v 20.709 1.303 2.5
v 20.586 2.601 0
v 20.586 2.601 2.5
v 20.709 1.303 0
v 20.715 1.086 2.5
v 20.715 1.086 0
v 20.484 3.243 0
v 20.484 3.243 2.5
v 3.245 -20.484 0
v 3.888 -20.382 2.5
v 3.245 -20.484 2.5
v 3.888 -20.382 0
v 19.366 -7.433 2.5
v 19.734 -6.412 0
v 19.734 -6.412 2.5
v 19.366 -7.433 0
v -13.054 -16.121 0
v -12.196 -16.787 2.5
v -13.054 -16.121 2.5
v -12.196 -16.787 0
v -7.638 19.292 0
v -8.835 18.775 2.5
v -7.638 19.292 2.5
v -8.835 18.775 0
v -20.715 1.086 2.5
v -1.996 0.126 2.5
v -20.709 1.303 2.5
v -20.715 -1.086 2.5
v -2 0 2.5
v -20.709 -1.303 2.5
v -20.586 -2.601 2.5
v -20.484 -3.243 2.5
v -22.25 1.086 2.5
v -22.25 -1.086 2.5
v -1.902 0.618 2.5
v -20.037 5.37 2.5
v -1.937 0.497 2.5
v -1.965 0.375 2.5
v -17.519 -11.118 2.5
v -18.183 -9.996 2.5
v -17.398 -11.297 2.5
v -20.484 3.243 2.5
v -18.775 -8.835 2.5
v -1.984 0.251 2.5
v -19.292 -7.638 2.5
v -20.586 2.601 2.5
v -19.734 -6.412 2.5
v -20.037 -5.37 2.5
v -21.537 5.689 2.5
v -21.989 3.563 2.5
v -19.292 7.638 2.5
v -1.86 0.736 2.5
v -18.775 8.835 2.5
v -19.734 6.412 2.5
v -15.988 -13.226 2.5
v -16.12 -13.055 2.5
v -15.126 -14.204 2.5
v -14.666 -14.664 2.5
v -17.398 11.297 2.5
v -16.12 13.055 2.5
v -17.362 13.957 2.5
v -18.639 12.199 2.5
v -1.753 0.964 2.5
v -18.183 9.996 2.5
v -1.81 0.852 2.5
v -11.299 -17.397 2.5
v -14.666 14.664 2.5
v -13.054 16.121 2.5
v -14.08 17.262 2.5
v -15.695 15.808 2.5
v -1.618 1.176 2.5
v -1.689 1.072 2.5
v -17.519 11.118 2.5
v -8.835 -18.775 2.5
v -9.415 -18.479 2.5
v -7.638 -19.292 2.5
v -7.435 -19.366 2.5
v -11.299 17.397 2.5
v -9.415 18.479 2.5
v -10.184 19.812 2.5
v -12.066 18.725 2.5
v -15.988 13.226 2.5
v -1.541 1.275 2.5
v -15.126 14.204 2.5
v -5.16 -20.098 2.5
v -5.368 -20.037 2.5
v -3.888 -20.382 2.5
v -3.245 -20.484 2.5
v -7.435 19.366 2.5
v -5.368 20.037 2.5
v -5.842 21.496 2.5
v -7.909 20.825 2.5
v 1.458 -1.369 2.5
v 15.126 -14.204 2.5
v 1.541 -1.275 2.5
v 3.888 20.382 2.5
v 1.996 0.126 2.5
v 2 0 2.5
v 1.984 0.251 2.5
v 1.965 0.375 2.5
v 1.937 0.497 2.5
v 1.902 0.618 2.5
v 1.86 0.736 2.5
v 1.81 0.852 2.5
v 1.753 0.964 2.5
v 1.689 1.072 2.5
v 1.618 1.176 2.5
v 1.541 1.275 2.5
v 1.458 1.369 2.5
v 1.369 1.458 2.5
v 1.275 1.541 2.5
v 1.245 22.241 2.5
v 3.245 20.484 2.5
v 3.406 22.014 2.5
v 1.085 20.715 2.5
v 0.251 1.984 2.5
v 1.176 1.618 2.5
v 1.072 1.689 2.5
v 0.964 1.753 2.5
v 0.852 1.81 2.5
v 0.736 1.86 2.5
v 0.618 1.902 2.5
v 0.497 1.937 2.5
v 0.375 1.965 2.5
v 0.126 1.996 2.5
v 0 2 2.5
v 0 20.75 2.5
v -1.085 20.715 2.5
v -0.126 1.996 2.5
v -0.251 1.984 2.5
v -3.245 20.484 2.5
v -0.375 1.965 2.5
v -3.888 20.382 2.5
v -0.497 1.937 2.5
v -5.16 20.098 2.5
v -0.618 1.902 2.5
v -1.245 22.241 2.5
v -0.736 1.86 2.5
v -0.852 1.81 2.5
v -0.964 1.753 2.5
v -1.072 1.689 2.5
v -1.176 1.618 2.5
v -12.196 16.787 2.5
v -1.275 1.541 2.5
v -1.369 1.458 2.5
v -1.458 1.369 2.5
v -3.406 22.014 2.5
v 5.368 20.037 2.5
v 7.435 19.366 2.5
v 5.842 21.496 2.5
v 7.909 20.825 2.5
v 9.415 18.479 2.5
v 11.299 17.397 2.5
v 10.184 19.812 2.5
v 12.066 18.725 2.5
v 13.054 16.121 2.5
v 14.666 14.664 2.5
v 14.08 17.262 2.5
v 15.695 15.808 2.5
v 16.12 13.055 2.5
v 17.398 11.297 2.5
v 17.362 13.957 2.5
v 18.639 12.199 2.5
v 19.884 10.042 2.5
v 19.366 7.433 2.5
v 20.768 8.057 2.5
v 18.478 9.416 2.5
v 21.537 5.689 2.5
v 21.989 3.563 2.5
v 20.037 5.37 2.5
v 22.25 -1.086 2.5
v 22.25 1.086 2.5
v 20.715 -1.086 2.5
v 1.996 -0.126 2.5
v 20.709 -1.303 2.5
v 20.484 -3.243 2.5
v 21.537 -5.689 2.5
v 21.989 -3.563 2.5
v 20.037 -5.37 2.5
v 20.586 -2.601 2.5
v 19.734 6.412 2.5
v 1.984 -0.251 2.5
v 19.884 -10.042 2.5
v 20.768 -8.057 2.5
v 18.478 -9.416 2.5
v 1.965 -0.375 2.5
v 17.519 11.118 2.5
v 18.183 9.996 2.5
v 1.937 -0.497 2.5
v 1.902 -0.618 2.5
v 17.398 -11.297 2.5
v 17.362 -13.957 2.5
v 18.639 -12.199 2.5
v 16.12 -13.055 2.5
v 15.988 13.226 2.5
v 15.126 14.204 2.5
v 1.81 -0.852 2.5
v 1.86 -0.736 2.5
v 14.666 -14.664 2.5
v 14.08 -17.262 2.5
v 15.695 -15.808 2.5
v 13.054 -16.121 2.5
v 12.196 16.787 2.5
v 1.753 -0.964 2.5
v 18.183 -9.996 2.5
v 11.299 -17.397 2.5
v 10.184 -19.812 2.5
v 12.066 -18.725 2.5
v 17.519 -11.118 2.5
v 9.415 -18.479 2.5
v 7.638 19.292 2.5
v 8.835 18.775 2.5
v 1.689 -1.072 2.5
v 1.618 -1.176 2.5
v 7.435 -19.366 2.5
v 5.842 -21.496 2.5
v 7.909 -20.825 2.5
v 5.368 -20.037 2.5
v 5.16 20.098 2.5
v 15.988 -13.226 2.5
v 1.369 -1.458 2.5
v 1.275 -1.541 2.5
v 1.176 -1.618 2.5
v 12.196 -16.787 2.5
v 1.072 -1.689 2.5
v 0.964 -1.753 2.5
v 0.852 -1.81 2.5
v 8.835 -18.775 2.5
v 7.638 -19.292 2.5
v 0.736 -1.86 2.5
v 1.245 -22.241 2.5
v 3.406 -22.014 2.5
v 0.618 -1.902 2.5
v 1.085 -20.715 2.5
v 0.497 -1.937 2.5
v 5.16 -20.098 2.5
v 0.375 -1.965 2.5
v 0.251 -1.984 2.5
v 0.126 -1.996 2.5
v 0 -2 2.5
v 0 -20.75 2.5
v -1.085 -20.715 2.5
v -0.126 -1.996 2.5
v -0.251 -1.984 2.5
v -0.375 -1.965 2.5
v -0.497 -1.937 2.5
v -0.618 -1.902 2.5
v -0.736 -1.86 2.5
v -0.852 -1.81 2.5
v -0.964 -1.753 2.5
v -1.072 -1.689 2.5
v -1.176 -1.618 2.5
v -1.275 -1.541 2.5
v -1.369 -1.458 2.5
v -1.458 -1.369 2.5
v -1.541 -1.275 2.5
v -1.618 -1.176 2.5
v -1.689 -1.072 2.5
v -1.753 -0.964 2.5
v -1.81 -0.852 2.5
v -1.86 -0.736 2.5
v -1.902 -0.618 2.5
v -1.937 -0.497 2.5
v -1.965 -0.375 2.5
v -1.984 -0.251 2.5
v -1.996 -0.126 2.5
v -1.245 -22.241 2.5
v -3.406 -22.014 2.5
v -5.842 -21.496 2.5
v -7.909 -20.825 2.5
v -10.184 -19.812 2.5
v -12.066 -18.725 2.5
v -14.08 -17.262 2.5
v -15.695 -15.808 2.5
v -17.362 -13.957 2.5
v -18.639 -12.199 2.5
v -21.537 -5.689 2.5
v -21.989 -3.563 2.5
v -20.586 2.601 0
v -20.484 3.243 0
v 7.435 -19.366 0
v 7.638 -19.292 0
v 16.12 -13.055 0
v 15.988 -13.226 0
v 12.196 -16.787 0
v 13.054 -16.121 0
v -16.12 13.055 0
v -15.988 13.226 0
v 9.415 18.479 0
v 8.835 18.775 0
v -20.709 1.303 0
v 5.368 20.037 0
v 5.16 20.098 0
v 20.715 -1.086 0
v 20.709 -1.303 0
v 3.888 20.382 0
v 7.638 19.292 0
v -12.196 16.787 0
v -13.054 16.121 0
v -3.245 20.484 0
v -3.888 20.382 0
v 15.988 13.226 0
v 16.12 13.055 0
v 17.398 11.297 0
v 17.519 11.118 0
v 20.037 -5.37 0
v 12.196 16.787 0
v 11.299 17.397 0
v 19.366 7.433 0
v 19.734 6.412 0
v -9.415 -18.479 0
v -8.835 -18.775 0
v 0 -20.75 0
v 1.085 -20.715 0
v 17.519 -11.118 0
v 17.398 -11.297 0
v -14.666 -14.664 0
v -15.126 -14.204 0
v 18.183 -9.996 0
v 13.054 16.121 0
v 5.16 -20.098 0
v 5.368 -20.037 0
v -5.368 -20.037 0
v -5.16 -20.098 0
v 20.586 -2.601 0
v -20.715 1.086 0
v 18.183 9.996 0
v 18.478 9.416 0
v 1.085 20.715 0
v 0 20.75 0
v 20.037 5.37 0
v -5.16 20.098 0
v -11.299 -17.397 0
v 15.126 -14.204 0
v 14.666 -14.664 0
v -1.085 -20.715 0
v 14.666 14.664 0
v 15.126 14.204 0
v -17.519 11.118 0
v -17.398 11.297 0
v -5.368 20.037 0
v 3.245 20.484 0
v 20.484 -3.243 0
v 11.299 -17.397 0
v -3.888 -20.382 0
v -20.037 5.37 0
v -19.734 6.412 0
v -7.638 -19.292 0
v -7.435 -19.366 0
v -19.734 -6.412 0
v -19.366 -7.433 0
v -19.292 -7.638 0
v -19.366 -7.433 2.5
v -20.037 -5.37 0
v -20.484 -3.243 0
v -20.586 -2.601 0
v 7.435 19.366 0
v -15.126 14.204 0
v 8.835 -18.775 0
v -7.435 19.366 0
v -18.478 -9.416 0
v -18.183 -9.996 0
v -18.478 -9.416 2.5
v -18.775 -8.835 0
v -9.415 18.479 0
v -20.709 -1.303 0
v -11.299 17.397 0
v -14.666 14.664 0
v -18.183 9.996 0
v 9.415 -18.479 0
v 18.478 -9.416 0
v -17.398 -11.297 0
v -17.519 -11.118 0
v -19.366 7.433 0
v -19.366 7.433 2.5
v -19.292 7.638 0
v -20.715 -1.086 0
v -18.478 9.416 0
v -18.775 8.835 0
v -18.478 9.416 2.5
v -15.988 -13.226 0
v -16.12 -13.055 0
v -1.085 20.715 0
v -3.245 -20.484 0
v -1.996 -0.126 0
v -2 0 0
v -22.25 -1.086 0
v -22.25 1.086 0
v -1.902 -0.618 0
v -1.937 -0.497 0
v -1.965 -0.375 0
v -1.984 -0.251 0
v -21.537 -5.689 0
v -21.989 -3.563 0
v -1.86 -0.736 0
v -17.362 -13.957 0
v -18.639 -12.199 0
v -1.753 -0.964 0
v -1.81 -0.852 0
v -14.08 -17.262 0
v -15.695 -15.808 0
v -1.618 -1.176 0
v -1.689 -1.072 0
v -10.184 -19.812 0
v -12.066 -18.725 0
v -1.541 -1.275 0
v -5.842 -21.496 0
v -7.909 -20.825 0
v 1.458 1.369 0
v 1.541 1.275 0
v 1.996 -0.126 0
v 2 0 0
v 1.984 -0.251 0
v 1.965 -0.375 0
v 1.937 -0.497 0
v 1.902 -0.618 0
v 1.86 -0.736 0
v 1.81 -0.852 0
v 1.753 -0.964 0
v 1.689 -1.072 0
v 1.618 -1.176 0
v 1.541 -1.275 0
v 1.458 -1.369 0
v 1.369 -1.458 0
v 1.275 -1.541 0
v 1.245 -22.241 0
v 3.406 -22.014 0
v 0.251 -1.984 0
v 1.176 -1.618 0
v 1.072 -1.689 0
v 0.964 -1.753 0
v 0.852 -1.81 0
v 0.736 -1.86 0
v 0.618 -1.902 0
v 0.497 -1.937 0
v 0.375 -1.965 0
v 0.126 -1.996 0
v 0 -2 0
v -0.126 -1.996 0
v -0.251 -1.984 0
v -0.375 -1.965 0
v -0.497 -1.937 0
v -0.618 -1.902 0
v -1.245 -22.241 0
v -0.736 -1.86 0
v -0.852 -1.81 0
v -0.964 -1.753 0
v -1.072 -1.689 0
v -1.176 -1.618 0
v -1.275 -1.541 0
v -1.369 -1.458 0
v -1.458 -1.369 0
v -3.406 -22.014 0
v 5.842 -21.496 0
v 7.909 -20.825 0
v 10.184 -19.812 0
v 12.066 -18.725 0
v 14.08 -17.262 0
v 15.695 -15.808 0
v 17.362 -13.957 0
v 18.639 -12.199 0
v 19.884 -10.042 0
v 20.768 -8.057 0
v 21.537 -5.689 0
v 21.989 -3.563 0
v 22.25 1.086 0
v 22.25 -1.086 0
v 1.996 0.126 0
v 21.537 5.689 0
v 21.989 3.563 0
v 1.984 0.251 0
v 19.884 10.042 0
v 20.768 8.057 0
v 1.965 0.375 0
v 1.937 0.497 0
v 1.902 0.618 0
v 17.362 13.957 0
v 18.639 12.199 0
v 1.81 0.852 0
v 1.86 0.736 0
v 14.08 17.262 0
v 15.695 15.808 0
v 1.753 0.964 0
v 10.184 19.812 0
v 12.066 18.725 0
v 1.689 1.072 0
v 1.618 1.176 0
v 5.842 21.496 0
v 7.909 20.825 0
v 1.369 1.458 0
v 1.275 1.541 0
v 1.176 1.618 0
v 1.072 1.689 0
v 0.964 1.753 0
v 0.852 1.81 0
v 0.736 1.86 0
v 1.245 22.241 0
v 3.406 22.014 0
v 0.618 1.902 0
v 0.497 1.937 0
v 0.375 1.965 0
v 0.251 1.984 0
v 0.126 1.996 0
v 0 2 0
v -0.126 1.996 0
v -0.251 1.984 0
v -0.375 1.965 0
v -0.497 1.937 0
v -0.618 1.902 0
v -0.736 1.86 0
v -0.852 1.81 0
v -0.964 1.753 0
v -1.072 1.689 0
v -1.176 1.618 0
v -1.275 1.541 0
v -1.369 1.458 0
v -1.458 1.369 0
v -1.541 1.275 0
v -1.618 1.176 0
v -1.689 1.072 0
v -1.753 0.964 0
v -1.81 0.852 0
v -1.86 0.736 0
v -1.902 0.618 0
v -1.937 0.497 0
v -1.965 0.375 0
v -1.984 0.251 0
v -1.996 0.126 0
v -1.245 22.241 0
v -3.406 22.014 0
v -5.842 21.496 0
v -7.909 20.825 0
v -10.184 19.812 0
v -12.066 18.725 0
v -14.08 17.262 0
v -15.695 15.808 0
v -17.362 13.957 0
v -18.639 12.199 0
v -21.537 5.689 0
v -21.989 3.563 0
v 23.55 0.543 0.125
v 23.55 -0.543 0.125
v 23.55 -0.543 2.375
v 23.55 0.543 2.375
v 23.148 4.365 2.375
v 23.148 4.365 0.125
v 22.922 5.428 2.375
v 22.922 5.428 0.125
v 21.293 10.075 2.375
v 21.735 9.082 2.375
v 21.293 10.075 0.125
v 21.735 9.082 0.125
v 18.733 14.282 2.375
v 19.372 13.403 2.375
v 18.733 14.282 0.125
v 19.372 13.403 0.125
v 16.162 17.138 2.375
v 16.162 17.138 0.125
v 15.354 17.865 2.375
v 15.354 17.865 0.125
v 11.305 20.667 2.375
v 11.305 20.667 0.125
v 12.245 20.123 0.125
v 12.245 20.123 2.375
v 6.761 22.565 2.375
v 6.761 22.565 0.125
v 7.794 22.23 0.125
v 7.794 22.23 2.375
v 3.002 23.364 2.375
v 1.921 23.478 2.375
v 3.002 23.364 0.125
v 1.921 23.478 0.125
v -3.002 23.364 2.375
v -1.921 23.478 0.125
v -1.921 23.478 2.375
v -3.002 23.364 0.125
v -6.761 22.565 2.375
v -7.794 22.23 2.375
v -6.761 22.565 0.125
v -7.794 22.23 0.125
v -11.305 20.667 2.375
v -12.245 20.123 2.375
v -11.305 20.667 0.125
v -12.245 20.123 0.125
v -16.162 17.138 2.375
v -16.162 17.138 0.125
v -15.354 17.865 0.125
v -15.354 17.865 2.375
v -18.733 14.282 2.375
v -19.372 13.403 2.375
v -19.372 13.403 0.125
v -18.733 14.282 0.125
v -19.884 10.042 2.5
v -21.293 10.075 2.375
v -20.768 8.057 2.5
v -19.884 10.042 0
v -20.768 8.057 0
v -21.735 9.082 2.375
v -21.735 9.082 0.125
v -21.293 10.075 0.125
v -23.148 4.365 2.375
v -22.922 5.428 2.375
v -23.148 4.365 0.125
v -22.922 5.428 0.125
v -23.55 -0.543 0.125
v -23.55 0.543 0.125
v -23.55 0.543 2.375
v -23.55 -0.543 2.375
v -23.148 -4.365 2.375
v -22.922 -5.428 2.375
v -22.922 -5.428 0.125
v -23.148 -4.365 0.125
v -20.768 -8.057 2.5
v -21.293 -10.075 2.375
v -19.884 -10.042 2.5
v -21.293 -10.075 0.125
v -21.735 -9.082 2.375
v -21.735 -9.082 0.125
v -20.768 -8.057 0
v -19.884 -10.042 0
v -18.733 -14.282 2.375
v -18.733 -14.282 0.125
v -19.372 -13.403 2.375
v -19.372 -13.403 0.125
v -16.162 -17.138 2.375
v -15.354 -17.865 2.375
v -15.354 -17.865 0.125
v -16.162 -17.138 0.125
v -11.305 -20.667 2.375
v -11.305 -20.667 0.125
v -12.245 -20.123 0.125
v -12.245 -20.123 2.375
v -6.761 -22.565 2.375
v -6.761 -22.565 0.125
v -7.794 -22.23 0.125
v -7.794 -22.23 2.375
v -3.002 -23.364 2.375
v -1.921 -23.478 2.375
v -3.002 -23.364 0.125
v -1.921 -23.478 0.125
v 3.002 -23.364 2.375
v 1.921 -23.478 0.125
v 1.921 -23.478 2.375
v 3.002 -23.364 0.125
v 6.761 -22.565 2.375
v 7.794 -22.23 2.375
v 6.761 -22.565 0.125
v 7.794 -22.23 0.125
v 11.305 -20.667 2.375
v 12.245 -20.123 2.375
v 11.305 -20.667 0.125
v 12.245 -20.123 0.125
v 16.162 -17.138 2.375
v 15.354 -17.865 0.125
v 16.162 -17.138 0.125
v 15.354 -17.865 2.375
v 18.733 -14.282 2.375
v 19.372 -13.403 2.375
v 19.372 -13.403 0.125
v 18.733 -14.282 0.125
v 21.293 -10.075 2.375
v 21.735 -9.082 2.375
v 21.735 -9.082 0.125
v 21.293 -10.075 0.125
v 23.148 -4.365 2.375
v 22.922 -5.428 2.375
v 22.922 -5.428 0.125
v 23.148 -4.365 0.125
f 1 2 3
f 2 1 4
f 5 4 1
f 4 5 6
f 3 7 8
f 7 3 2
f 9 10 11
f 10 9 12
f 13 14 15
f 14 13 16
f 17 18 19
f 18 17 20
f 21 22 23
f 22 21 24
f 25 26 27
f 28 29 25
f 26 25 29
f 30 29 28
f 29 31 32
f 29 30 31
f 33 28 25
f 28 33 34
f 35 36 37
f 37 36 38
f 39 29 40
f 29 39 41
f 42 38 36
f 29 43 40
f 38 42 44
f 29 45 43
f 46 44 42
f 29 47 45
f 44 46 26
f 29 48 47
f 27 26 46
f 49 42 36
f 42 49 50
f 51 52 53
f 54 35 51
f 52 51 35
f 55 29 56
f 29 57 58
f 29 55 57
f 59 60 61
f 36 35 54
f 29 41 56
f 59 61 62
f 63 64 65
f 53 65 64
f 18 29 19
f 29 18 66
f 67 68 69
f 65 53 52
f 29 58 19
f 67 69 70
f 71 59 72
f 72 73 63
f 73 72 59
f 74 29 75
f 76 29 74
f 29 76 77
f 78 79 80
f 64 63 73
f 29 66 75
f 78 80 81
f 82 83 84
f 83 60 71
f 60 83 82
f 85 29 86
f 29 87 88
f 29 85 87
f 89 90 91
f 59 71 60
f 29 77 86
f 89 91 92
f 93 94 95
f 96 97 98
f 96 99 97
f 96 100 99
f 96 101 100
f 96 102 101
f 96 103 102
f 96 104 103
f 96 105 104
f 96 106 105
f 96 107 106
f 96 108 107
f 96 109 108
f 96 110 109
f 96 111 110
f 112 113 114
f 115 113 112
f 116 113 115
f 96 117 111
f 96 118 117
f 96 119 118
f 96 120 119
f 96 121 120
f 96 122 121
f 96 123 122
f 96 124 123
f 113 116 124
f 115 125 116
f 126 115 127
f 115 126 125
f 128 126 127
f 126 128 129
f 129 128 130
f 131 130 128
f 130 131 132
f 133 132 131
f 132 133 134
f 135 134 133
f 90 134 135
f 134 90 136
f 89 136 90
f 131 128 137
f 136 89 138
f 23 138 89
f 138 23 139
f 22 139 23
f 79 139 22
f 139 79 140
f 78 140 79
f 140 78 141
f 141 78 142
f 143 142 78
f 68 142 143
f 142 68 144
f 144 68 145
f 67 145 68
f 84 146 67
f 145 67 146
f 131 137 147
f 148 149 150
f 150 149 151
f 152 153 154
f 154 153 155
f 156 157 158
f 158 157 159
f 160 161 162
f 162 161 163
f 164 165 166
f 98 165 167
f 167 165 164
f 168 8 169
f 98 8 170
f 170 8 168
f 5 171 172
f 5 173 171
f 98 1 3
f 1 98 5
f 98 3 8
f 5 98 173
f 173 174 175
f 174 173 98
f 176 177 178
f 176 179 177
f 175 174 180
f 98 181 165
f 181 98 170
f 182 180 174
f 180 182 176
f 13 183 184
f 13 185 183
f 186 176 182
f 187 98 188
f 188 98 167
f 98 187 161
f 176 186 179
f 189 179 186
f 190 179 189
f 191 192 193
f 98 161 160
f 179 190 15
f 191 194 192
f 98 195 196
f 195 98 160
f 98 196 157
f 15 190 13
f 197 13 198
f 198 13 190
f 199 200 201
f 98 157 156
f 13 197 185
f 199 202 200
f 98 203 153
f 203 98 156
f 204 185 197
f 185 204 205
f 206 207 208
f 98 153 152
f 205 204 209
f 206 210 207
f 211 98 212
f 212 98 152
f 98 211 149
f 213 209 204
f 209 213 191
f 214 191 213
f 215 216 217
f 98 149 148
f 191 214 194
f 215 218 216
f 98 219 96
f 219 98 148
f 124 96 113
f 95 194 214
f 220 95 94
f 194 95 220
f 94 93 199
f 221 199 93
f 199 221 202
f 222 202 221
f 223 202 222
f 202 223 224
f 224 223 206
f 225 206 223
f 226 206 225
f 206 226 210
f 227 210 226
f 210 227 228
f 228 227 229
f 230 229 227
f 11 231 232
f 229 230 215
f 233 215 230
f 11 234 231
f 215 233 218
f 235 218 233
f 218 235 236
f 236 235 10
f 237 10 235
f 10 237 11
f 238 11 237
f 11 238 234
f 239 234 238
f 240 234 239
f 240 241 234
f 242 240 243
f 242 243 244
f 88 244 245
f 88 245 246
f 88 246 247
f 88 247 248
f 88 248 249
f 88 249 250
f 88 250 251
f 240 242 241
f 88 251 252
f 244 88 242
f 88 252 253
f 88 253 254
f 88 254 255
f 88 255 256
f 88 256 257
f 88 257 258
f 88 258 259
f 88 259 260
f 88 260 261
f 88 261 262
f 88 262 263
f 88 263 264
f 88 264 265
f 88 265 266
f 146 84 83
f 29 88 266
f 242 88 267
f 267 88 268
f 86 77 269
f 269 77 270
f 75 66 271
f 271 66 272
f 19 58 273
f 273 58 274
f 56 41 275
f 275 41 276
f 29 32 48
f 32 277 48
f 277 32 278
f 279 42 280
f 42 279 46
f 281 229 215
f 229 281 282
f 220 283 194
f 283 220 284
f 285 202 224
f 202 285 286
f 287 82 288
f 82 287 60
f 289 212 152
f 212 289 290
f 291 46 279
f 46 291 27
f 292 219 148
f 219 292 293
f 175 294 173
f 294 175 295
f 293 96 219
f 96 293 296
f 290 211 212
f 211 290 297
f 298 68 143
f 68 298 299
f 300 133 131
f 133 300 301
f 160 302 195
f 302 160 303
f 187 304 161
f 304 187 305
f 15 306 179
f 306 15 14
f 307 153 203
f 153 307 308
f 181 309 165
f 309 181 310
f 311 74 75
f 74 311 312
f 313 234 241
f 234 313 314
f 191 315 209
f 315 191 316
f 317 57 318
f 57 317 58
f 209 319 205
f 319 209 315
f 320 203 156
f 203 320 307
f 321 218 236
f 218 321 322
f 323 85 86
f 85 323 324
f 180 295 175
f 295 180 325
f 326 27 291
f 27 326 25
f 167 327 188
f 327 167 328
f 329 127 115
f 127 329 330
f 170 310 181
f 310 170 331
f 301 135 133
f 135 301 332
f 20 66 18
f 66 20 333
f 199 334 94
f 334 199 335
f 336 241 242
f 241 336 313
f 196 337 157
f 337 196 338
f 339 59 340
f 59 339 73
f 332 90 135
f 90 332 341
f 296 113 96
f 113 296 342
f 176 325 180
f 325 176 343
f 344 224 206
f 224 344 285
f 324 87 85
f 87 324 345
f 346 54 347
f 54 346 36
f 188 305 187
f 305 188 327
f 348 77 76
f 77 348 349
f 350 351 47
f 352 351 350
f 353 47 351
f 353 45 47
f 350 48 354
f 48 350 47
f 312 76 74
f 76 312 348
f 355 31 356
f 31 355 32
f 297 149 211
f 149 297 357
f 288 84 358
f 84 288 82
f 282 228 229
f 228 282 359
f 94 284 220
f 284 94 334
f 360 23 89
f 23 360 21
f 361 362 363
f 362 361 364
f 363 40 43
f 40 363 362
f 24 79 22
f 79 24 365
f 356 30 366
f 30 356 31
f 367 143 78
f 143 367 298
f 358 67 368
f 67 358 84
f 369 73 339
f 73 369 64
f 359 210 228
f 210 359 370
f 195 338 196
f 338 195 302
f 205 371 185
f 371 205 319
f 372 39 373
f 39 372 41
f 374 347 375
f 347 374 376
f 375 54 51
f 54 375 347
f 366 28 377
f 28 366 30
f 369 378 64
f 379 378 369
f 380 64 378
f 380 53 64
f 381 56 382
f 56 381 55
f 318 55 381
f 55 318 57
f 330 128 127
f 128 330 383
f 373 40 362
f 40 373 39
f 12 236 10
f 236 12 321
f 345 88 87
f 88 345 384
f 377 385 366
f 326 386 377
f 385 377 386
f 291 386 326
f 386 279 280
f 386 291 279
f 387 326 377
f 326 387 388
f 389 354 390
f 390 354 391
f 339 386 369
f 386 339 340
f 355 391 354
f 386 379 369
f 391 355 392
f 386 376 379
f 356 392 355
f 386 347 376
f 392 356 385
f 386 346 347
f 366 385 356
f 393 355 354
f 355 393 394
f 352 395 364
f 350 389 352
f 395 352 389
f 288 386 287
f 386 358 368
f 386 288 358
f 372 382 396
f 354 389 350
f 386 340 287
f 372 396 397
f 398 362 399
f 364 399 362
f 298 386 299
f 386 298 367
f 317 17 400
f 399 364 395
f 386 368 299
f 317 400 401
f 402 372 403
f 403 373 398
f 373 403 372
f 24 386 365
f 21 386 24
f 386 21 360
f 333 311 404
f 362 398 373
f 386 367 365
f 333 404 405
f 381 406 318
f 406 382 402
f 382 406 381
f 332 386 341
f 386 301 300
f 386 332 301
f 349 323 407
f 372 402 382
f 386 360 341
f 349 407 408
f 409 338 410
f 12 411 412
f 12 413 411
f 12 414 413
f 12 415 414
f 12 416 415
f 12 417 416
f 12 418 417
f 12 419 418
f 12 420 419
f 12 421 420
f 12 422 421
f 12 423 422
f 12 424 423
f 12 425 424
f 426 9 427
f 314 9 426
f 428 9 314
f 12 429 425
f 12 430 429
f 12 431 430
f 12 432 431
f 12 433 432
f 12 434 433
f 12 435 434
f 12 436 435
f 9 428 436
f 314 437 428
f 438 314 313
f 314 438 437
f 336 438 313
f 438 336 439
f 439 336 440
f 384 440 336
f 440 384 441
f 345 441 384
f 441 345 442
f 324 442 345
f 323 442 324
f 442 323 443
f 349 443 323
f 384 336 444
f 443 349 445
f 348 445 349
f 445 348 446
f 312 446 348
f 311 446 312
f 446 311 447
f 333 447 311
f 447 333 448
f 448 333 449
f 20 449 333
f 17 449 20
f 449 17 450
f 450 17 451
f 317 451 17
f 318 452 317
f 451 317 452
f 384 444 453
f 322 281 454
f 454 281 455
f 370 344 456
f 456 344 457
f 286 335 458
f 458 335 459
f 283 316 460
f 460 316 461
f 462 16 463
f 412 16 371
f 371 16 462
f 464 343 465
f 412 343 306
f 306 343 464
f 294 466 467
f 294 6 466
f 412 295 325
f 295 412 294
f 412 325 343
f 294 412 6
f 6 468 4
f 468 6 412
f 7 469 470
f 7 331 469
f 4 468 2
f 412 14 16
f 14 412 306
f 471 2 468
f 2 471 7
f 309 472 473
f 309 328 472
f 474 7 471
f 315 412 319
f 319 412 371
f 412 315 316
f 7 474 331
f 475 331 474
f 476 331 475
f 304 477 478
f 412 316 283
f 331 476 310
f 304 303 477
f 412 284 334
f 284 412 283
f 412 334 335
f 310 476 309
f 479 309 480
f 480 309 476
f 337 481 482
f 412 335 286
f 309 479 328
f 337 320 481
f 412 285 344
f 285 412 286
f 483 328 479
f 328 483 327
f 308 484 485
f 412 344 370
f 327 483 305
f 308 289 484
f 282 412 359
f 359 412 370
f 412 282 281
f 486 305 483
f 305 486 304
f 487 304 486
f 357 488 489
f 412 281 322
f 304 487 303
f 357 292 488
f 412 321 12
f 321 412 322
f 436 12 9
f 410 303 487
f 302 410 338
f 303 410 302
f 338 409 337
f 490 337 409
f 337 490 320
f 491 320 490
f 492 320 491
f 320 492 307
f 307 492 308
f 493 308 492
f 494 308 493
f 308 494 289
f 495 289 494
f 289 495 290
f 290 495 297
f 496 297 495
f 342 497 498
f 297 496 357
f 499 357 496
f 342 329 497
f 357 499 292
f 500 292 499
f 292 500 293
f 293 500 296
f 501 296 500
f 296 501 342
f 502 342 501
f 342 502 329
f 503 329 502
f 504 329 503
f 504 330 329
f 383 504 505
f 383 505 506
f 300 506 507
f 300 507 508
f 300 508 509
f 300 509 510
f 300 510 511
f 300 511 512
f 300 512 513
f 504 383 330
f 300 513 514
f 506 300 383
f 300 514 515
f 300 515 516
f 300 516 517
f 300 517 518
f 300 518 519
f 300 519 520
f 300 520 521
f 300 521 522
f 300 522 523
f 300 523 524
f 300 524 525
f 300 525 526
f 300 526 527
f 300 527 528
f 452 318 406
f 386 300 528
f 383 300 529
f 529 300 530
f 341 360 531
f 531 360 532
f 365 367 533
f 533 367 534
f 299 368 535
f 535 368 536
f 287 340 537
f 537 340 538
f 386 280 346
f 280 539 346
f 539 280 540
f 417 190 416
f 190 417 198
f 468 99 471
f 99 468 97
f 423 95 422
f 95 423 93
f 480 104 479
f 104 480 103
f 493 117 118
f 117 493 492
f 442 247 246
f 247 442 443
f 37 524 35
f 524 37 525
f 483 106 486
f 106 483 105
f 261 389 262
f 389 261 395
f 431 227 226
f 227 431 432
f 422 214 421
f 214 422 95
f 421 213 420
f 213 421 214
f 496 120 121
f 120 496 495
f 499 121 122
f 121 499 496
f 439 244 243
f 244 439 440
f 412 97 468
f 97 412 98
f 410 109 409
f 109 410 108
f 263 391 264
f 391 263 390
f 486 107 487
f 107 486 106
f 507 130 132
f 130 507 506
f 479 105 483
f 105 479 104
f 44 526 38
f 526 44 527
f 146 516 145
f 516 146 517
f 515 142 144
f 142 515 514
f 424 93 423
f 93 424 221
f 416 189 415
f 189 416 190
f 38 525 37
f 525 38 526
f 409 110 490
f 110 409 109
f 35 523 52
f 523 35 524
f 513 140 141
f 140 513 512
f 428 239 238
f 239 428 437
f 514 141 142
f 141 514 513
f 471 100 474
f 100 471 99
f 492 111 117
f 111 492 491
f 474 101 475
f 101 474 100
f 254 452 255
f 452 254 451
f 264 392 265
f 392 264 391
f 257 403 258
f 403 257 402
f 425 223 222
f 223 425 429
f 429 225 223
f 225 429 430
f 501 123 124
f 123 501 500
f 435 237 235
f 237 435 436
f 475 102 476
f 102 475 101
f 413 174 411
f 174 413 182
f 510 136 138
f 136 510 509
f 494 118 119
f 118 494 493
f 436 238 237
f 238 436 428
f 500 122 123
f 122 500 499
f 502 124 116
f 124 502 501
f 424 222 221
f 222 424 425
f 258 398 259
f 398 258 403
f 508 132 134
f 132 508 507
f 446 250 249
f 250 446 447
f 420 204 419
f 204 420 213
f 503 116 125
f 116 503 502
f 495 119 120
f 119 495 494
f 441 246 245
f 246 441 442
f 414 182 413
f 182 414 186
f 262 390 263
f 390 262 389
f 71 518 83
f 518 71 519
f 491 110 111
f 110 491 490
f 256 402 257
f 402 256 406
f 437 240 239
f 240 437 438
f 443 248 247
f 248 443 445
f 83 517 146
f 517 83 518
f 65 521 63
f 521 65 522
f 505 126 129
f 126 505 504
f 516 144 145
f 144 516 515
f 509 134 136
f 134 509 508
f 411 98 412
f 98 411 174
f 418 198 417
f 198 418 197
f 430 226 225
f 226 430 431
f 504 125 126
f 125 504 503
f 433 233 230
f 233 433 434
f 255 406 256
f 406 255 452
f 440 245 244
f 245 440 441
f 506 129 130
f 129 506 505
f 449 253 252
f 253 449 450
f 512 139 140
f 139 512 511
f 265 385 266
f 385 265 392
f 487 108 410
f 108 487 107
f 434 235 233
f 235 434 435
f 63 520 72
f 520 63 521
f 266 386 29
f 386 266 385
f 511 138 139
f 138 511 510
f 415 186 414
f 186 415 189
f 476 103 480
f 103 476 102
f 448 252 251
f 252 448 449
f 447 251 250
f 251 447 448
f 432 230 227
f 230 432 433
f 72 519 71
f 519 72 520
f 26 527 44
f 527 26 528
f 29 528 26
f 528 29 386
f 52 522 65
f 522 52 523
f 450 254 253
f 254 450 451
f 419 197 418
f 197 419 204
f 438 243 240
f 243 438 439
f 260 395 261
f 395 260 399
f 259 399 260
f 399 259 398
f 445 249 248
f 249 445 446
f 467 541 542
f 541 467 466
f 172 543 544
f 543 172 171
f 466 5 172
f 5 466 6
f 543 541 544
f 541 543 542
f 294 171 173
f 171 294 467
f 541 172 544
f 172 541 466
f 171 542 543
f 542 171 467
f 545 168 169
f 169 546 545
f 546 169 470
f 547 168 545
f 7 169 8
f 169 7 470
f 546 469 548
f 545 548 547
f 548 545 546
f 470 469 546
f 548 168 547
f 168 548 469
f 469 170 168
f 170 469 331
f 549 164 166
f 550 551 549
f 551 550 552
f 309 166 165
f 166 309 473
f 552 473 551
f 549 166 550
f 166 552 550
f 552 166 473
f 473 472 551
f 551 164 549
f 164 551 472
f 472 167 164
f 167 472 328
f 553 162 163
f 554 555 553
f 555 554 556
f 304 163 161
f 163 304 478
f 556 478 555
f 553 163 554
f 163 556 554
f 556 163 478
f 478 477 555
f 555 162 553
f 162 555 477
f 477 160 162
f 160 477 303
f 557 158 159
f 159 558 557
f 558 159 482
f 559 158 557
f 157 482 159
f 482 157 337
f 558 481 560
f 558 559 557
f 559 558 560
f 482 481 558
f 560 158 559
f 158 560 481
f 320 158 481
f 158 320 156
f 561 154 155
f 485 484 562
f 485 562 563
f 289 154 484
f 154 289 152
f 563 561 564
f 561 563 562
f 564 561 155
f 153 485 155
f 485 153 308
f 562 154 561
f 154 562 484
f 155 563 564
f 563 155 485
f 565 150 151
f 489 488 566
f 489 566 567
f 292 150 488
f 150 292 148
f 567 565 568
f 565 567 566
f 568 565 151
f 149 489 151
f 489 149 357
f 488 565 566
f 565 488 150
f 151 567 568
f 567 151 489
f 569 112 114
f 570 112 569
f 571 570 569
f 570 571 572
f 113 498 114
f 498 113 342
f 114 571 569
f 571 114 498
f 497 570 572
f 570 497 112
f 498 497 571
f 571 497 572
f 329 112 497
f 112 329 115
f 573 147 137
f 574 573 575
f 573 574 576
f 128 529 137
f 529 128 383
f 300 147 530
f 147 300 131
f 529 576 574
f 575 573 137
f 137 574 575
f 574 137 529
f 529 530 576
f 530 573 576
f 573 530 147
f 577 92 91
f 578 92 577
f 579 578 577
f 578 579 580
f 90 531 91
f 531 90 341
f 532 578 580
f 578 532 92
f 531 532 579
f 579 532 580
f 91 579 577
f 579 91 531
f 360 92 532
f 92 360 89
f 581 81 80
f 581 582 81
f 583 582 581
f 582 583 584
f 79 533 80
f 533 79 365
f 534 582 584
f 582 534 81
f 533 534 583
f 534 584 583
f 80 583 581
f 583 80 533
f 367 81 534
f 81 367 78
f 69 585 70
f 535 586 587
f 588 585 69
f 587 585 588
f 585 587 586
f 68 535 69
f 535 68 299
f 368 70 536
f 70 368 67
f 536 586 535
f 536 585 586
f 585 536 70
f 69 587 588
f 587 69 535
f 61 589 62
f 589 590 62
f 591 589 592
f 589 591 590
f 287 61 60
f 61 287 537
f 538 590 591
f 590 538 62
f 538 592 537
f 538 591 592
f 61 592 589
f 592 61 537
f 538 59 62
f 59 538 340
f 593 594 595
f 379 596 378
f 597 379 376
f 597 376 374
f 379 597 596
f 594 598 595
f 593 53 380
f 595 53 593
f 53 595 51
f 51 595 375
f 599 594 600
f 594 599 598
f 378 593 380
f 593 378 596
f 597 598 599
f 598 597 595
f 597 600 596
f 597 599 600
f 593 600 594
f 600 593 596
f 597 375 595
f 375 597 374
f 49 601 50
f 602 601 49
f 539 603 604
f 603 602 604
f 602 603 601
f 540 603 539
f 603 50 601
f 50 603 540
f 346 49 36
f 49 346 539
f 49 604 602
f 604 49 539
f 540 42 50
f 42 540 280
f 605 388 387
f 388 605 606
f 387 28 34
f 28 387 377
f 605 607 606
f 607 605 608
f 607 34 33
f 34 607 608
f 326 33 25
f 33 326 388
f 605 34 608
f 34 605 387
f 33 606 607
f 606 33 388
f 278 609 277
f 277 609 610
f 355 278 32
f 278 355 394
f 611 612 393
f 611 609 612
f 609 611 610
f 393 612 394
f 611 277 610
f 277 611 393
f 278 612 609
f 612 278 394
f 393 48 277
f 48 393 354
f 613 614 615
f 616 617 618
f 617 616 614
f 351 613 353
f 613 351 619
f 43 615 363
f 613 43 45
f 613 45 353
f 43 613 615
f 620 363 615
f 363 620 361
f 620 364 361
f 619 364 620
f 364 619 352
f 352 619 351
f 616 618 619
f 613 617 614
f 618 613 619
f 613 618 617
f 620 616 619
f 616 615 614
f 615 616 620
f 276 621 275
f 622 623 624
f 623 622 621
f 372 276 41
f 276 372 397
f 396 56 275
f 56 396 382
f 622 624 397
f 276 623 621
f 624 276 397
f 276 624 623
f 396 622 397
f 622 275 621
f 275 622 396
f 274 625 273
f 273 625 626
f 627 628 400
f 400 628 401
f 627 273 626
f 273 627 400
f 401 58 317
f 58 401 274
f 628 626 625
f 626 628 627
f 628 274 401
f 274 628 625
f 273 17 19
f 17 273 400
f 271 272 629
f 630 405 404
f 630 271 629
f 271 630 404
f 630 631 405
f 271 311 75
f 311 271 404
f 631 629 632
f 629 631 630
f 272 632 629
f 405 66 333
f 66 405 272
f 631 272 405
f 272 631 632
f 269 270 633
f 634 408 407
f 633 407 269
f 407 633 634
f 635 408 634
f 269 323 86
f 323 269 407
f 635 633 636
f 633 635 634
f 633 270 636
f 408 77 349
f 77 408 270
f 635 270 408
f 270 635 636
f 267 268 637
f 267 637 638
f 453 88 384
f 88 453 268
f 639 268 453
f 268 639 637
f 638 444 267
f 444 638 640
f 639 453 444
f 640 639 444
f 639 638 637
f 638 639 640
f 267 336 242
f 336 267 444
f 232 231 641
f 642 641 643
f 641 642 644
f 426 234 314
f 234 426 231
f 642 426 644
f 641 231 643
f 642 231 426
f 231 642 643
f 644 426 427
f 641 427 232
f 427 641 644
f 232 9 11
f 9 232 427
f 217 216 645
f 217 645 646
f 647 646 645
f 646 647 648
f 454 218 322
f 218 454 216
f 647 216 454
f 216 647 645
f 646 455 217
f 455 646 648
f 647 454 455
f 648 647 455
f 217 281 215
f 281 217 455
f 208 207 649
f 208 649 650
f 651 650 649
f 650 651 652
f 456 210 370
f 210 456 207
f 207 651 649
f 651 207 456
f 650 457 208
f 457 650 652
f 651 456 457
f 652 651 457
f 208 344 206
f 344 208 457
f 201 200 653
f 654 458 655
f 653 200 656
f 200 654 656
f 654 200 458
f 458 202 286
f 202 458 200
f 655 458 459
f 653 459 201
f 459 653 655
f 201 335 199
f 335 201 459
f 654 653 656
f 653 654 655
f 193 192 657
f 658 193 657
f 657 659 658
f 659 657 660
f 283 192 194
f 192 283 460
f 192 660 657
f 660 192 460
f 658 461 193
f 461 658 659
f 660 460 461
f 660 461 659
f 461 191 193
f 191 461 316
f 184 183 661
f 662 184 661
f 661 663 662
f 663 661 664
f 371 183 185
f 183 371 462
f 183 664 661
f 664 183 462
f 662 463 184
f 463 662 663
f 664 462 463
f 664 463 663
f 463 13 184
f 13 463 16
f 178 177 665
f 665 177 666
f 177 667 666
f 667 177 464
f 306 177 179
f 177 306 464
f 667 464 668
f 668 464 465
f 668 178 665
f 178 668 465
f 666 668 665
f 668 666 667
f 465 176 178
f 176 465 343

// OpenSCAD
// Achim Breidenbach achim@boinx.com
// based on the work form https://www.thingiverse.com/thing:54395

// ----------- Parameters to enter:

// Gear height:
height = 2.5;

// Size of the Shaft hole. (zero for no hole)
hole_diameter = 4;

// Number of Cogs:
z = 30;

// module (make sure that all gears of your trasmit has the same module)
// https://en.wikipedia.org/wiki/Gear#Standard_pitches_and_the_module_system
m = 1.5;


// ----------- Calculations:

d = z * m;
da = d + 2 * m;
c = 0.167 * m;
df = d - 2 * (m + c);

//Size of the internal donut.
internal_diameter = df;

//Resolution of the donut.
res = 100;        //[1:100]

//Number of Cogs.
cogs = z;

//Total length of the cog. 
cog_length = (da - df) / 2;

//Width of the cogs base. 
cog_base_width = ((df * 3.14159) / z) / 2;

//Height of the cogs base. 
cog_base_height = height;

//Width of the tip.
cog_tip_width = cog_base_width * 0.5;

//Height of the tip.
tip_height = height * 0.9;

//Amount of the cog length, which lacks angle, aka height of the cogbase.
no_angle = (da - d) / 2;


module cog() {

    union() {
        difference() {

            translate([0, 0, 0]) {
                cylinder(height, internal_diameter / 2, internal_diameter / 2, $fn = res, center = true) ;
            }

            translate([0, 0, 0]) {
                cylinder(height + 2, hole_diameter / 2, hole_diameter / 2, $fn = res, center = true);

            }
        }
    }


    for (i = [0 : (cogs - 1)]) {//the spikes
        hull() {
            rotate(i * 360 / cogs, [0, 0, 1])
                translate([internal_diameter / 2, 0, 0]) {
                    cube([no_angle * 2, cog_base_width, cog_base_height], center = true);
                    translate([cog_length - 0.5, 0, 0]) {
                        cube([.1, cog_tip_width, tip_height], center = true);
                    }
                }


        }
    }
}


translate([0, 0, height / 2]) {
    color([0, 0.6, 0.8]) {
        cog();
    }
}
